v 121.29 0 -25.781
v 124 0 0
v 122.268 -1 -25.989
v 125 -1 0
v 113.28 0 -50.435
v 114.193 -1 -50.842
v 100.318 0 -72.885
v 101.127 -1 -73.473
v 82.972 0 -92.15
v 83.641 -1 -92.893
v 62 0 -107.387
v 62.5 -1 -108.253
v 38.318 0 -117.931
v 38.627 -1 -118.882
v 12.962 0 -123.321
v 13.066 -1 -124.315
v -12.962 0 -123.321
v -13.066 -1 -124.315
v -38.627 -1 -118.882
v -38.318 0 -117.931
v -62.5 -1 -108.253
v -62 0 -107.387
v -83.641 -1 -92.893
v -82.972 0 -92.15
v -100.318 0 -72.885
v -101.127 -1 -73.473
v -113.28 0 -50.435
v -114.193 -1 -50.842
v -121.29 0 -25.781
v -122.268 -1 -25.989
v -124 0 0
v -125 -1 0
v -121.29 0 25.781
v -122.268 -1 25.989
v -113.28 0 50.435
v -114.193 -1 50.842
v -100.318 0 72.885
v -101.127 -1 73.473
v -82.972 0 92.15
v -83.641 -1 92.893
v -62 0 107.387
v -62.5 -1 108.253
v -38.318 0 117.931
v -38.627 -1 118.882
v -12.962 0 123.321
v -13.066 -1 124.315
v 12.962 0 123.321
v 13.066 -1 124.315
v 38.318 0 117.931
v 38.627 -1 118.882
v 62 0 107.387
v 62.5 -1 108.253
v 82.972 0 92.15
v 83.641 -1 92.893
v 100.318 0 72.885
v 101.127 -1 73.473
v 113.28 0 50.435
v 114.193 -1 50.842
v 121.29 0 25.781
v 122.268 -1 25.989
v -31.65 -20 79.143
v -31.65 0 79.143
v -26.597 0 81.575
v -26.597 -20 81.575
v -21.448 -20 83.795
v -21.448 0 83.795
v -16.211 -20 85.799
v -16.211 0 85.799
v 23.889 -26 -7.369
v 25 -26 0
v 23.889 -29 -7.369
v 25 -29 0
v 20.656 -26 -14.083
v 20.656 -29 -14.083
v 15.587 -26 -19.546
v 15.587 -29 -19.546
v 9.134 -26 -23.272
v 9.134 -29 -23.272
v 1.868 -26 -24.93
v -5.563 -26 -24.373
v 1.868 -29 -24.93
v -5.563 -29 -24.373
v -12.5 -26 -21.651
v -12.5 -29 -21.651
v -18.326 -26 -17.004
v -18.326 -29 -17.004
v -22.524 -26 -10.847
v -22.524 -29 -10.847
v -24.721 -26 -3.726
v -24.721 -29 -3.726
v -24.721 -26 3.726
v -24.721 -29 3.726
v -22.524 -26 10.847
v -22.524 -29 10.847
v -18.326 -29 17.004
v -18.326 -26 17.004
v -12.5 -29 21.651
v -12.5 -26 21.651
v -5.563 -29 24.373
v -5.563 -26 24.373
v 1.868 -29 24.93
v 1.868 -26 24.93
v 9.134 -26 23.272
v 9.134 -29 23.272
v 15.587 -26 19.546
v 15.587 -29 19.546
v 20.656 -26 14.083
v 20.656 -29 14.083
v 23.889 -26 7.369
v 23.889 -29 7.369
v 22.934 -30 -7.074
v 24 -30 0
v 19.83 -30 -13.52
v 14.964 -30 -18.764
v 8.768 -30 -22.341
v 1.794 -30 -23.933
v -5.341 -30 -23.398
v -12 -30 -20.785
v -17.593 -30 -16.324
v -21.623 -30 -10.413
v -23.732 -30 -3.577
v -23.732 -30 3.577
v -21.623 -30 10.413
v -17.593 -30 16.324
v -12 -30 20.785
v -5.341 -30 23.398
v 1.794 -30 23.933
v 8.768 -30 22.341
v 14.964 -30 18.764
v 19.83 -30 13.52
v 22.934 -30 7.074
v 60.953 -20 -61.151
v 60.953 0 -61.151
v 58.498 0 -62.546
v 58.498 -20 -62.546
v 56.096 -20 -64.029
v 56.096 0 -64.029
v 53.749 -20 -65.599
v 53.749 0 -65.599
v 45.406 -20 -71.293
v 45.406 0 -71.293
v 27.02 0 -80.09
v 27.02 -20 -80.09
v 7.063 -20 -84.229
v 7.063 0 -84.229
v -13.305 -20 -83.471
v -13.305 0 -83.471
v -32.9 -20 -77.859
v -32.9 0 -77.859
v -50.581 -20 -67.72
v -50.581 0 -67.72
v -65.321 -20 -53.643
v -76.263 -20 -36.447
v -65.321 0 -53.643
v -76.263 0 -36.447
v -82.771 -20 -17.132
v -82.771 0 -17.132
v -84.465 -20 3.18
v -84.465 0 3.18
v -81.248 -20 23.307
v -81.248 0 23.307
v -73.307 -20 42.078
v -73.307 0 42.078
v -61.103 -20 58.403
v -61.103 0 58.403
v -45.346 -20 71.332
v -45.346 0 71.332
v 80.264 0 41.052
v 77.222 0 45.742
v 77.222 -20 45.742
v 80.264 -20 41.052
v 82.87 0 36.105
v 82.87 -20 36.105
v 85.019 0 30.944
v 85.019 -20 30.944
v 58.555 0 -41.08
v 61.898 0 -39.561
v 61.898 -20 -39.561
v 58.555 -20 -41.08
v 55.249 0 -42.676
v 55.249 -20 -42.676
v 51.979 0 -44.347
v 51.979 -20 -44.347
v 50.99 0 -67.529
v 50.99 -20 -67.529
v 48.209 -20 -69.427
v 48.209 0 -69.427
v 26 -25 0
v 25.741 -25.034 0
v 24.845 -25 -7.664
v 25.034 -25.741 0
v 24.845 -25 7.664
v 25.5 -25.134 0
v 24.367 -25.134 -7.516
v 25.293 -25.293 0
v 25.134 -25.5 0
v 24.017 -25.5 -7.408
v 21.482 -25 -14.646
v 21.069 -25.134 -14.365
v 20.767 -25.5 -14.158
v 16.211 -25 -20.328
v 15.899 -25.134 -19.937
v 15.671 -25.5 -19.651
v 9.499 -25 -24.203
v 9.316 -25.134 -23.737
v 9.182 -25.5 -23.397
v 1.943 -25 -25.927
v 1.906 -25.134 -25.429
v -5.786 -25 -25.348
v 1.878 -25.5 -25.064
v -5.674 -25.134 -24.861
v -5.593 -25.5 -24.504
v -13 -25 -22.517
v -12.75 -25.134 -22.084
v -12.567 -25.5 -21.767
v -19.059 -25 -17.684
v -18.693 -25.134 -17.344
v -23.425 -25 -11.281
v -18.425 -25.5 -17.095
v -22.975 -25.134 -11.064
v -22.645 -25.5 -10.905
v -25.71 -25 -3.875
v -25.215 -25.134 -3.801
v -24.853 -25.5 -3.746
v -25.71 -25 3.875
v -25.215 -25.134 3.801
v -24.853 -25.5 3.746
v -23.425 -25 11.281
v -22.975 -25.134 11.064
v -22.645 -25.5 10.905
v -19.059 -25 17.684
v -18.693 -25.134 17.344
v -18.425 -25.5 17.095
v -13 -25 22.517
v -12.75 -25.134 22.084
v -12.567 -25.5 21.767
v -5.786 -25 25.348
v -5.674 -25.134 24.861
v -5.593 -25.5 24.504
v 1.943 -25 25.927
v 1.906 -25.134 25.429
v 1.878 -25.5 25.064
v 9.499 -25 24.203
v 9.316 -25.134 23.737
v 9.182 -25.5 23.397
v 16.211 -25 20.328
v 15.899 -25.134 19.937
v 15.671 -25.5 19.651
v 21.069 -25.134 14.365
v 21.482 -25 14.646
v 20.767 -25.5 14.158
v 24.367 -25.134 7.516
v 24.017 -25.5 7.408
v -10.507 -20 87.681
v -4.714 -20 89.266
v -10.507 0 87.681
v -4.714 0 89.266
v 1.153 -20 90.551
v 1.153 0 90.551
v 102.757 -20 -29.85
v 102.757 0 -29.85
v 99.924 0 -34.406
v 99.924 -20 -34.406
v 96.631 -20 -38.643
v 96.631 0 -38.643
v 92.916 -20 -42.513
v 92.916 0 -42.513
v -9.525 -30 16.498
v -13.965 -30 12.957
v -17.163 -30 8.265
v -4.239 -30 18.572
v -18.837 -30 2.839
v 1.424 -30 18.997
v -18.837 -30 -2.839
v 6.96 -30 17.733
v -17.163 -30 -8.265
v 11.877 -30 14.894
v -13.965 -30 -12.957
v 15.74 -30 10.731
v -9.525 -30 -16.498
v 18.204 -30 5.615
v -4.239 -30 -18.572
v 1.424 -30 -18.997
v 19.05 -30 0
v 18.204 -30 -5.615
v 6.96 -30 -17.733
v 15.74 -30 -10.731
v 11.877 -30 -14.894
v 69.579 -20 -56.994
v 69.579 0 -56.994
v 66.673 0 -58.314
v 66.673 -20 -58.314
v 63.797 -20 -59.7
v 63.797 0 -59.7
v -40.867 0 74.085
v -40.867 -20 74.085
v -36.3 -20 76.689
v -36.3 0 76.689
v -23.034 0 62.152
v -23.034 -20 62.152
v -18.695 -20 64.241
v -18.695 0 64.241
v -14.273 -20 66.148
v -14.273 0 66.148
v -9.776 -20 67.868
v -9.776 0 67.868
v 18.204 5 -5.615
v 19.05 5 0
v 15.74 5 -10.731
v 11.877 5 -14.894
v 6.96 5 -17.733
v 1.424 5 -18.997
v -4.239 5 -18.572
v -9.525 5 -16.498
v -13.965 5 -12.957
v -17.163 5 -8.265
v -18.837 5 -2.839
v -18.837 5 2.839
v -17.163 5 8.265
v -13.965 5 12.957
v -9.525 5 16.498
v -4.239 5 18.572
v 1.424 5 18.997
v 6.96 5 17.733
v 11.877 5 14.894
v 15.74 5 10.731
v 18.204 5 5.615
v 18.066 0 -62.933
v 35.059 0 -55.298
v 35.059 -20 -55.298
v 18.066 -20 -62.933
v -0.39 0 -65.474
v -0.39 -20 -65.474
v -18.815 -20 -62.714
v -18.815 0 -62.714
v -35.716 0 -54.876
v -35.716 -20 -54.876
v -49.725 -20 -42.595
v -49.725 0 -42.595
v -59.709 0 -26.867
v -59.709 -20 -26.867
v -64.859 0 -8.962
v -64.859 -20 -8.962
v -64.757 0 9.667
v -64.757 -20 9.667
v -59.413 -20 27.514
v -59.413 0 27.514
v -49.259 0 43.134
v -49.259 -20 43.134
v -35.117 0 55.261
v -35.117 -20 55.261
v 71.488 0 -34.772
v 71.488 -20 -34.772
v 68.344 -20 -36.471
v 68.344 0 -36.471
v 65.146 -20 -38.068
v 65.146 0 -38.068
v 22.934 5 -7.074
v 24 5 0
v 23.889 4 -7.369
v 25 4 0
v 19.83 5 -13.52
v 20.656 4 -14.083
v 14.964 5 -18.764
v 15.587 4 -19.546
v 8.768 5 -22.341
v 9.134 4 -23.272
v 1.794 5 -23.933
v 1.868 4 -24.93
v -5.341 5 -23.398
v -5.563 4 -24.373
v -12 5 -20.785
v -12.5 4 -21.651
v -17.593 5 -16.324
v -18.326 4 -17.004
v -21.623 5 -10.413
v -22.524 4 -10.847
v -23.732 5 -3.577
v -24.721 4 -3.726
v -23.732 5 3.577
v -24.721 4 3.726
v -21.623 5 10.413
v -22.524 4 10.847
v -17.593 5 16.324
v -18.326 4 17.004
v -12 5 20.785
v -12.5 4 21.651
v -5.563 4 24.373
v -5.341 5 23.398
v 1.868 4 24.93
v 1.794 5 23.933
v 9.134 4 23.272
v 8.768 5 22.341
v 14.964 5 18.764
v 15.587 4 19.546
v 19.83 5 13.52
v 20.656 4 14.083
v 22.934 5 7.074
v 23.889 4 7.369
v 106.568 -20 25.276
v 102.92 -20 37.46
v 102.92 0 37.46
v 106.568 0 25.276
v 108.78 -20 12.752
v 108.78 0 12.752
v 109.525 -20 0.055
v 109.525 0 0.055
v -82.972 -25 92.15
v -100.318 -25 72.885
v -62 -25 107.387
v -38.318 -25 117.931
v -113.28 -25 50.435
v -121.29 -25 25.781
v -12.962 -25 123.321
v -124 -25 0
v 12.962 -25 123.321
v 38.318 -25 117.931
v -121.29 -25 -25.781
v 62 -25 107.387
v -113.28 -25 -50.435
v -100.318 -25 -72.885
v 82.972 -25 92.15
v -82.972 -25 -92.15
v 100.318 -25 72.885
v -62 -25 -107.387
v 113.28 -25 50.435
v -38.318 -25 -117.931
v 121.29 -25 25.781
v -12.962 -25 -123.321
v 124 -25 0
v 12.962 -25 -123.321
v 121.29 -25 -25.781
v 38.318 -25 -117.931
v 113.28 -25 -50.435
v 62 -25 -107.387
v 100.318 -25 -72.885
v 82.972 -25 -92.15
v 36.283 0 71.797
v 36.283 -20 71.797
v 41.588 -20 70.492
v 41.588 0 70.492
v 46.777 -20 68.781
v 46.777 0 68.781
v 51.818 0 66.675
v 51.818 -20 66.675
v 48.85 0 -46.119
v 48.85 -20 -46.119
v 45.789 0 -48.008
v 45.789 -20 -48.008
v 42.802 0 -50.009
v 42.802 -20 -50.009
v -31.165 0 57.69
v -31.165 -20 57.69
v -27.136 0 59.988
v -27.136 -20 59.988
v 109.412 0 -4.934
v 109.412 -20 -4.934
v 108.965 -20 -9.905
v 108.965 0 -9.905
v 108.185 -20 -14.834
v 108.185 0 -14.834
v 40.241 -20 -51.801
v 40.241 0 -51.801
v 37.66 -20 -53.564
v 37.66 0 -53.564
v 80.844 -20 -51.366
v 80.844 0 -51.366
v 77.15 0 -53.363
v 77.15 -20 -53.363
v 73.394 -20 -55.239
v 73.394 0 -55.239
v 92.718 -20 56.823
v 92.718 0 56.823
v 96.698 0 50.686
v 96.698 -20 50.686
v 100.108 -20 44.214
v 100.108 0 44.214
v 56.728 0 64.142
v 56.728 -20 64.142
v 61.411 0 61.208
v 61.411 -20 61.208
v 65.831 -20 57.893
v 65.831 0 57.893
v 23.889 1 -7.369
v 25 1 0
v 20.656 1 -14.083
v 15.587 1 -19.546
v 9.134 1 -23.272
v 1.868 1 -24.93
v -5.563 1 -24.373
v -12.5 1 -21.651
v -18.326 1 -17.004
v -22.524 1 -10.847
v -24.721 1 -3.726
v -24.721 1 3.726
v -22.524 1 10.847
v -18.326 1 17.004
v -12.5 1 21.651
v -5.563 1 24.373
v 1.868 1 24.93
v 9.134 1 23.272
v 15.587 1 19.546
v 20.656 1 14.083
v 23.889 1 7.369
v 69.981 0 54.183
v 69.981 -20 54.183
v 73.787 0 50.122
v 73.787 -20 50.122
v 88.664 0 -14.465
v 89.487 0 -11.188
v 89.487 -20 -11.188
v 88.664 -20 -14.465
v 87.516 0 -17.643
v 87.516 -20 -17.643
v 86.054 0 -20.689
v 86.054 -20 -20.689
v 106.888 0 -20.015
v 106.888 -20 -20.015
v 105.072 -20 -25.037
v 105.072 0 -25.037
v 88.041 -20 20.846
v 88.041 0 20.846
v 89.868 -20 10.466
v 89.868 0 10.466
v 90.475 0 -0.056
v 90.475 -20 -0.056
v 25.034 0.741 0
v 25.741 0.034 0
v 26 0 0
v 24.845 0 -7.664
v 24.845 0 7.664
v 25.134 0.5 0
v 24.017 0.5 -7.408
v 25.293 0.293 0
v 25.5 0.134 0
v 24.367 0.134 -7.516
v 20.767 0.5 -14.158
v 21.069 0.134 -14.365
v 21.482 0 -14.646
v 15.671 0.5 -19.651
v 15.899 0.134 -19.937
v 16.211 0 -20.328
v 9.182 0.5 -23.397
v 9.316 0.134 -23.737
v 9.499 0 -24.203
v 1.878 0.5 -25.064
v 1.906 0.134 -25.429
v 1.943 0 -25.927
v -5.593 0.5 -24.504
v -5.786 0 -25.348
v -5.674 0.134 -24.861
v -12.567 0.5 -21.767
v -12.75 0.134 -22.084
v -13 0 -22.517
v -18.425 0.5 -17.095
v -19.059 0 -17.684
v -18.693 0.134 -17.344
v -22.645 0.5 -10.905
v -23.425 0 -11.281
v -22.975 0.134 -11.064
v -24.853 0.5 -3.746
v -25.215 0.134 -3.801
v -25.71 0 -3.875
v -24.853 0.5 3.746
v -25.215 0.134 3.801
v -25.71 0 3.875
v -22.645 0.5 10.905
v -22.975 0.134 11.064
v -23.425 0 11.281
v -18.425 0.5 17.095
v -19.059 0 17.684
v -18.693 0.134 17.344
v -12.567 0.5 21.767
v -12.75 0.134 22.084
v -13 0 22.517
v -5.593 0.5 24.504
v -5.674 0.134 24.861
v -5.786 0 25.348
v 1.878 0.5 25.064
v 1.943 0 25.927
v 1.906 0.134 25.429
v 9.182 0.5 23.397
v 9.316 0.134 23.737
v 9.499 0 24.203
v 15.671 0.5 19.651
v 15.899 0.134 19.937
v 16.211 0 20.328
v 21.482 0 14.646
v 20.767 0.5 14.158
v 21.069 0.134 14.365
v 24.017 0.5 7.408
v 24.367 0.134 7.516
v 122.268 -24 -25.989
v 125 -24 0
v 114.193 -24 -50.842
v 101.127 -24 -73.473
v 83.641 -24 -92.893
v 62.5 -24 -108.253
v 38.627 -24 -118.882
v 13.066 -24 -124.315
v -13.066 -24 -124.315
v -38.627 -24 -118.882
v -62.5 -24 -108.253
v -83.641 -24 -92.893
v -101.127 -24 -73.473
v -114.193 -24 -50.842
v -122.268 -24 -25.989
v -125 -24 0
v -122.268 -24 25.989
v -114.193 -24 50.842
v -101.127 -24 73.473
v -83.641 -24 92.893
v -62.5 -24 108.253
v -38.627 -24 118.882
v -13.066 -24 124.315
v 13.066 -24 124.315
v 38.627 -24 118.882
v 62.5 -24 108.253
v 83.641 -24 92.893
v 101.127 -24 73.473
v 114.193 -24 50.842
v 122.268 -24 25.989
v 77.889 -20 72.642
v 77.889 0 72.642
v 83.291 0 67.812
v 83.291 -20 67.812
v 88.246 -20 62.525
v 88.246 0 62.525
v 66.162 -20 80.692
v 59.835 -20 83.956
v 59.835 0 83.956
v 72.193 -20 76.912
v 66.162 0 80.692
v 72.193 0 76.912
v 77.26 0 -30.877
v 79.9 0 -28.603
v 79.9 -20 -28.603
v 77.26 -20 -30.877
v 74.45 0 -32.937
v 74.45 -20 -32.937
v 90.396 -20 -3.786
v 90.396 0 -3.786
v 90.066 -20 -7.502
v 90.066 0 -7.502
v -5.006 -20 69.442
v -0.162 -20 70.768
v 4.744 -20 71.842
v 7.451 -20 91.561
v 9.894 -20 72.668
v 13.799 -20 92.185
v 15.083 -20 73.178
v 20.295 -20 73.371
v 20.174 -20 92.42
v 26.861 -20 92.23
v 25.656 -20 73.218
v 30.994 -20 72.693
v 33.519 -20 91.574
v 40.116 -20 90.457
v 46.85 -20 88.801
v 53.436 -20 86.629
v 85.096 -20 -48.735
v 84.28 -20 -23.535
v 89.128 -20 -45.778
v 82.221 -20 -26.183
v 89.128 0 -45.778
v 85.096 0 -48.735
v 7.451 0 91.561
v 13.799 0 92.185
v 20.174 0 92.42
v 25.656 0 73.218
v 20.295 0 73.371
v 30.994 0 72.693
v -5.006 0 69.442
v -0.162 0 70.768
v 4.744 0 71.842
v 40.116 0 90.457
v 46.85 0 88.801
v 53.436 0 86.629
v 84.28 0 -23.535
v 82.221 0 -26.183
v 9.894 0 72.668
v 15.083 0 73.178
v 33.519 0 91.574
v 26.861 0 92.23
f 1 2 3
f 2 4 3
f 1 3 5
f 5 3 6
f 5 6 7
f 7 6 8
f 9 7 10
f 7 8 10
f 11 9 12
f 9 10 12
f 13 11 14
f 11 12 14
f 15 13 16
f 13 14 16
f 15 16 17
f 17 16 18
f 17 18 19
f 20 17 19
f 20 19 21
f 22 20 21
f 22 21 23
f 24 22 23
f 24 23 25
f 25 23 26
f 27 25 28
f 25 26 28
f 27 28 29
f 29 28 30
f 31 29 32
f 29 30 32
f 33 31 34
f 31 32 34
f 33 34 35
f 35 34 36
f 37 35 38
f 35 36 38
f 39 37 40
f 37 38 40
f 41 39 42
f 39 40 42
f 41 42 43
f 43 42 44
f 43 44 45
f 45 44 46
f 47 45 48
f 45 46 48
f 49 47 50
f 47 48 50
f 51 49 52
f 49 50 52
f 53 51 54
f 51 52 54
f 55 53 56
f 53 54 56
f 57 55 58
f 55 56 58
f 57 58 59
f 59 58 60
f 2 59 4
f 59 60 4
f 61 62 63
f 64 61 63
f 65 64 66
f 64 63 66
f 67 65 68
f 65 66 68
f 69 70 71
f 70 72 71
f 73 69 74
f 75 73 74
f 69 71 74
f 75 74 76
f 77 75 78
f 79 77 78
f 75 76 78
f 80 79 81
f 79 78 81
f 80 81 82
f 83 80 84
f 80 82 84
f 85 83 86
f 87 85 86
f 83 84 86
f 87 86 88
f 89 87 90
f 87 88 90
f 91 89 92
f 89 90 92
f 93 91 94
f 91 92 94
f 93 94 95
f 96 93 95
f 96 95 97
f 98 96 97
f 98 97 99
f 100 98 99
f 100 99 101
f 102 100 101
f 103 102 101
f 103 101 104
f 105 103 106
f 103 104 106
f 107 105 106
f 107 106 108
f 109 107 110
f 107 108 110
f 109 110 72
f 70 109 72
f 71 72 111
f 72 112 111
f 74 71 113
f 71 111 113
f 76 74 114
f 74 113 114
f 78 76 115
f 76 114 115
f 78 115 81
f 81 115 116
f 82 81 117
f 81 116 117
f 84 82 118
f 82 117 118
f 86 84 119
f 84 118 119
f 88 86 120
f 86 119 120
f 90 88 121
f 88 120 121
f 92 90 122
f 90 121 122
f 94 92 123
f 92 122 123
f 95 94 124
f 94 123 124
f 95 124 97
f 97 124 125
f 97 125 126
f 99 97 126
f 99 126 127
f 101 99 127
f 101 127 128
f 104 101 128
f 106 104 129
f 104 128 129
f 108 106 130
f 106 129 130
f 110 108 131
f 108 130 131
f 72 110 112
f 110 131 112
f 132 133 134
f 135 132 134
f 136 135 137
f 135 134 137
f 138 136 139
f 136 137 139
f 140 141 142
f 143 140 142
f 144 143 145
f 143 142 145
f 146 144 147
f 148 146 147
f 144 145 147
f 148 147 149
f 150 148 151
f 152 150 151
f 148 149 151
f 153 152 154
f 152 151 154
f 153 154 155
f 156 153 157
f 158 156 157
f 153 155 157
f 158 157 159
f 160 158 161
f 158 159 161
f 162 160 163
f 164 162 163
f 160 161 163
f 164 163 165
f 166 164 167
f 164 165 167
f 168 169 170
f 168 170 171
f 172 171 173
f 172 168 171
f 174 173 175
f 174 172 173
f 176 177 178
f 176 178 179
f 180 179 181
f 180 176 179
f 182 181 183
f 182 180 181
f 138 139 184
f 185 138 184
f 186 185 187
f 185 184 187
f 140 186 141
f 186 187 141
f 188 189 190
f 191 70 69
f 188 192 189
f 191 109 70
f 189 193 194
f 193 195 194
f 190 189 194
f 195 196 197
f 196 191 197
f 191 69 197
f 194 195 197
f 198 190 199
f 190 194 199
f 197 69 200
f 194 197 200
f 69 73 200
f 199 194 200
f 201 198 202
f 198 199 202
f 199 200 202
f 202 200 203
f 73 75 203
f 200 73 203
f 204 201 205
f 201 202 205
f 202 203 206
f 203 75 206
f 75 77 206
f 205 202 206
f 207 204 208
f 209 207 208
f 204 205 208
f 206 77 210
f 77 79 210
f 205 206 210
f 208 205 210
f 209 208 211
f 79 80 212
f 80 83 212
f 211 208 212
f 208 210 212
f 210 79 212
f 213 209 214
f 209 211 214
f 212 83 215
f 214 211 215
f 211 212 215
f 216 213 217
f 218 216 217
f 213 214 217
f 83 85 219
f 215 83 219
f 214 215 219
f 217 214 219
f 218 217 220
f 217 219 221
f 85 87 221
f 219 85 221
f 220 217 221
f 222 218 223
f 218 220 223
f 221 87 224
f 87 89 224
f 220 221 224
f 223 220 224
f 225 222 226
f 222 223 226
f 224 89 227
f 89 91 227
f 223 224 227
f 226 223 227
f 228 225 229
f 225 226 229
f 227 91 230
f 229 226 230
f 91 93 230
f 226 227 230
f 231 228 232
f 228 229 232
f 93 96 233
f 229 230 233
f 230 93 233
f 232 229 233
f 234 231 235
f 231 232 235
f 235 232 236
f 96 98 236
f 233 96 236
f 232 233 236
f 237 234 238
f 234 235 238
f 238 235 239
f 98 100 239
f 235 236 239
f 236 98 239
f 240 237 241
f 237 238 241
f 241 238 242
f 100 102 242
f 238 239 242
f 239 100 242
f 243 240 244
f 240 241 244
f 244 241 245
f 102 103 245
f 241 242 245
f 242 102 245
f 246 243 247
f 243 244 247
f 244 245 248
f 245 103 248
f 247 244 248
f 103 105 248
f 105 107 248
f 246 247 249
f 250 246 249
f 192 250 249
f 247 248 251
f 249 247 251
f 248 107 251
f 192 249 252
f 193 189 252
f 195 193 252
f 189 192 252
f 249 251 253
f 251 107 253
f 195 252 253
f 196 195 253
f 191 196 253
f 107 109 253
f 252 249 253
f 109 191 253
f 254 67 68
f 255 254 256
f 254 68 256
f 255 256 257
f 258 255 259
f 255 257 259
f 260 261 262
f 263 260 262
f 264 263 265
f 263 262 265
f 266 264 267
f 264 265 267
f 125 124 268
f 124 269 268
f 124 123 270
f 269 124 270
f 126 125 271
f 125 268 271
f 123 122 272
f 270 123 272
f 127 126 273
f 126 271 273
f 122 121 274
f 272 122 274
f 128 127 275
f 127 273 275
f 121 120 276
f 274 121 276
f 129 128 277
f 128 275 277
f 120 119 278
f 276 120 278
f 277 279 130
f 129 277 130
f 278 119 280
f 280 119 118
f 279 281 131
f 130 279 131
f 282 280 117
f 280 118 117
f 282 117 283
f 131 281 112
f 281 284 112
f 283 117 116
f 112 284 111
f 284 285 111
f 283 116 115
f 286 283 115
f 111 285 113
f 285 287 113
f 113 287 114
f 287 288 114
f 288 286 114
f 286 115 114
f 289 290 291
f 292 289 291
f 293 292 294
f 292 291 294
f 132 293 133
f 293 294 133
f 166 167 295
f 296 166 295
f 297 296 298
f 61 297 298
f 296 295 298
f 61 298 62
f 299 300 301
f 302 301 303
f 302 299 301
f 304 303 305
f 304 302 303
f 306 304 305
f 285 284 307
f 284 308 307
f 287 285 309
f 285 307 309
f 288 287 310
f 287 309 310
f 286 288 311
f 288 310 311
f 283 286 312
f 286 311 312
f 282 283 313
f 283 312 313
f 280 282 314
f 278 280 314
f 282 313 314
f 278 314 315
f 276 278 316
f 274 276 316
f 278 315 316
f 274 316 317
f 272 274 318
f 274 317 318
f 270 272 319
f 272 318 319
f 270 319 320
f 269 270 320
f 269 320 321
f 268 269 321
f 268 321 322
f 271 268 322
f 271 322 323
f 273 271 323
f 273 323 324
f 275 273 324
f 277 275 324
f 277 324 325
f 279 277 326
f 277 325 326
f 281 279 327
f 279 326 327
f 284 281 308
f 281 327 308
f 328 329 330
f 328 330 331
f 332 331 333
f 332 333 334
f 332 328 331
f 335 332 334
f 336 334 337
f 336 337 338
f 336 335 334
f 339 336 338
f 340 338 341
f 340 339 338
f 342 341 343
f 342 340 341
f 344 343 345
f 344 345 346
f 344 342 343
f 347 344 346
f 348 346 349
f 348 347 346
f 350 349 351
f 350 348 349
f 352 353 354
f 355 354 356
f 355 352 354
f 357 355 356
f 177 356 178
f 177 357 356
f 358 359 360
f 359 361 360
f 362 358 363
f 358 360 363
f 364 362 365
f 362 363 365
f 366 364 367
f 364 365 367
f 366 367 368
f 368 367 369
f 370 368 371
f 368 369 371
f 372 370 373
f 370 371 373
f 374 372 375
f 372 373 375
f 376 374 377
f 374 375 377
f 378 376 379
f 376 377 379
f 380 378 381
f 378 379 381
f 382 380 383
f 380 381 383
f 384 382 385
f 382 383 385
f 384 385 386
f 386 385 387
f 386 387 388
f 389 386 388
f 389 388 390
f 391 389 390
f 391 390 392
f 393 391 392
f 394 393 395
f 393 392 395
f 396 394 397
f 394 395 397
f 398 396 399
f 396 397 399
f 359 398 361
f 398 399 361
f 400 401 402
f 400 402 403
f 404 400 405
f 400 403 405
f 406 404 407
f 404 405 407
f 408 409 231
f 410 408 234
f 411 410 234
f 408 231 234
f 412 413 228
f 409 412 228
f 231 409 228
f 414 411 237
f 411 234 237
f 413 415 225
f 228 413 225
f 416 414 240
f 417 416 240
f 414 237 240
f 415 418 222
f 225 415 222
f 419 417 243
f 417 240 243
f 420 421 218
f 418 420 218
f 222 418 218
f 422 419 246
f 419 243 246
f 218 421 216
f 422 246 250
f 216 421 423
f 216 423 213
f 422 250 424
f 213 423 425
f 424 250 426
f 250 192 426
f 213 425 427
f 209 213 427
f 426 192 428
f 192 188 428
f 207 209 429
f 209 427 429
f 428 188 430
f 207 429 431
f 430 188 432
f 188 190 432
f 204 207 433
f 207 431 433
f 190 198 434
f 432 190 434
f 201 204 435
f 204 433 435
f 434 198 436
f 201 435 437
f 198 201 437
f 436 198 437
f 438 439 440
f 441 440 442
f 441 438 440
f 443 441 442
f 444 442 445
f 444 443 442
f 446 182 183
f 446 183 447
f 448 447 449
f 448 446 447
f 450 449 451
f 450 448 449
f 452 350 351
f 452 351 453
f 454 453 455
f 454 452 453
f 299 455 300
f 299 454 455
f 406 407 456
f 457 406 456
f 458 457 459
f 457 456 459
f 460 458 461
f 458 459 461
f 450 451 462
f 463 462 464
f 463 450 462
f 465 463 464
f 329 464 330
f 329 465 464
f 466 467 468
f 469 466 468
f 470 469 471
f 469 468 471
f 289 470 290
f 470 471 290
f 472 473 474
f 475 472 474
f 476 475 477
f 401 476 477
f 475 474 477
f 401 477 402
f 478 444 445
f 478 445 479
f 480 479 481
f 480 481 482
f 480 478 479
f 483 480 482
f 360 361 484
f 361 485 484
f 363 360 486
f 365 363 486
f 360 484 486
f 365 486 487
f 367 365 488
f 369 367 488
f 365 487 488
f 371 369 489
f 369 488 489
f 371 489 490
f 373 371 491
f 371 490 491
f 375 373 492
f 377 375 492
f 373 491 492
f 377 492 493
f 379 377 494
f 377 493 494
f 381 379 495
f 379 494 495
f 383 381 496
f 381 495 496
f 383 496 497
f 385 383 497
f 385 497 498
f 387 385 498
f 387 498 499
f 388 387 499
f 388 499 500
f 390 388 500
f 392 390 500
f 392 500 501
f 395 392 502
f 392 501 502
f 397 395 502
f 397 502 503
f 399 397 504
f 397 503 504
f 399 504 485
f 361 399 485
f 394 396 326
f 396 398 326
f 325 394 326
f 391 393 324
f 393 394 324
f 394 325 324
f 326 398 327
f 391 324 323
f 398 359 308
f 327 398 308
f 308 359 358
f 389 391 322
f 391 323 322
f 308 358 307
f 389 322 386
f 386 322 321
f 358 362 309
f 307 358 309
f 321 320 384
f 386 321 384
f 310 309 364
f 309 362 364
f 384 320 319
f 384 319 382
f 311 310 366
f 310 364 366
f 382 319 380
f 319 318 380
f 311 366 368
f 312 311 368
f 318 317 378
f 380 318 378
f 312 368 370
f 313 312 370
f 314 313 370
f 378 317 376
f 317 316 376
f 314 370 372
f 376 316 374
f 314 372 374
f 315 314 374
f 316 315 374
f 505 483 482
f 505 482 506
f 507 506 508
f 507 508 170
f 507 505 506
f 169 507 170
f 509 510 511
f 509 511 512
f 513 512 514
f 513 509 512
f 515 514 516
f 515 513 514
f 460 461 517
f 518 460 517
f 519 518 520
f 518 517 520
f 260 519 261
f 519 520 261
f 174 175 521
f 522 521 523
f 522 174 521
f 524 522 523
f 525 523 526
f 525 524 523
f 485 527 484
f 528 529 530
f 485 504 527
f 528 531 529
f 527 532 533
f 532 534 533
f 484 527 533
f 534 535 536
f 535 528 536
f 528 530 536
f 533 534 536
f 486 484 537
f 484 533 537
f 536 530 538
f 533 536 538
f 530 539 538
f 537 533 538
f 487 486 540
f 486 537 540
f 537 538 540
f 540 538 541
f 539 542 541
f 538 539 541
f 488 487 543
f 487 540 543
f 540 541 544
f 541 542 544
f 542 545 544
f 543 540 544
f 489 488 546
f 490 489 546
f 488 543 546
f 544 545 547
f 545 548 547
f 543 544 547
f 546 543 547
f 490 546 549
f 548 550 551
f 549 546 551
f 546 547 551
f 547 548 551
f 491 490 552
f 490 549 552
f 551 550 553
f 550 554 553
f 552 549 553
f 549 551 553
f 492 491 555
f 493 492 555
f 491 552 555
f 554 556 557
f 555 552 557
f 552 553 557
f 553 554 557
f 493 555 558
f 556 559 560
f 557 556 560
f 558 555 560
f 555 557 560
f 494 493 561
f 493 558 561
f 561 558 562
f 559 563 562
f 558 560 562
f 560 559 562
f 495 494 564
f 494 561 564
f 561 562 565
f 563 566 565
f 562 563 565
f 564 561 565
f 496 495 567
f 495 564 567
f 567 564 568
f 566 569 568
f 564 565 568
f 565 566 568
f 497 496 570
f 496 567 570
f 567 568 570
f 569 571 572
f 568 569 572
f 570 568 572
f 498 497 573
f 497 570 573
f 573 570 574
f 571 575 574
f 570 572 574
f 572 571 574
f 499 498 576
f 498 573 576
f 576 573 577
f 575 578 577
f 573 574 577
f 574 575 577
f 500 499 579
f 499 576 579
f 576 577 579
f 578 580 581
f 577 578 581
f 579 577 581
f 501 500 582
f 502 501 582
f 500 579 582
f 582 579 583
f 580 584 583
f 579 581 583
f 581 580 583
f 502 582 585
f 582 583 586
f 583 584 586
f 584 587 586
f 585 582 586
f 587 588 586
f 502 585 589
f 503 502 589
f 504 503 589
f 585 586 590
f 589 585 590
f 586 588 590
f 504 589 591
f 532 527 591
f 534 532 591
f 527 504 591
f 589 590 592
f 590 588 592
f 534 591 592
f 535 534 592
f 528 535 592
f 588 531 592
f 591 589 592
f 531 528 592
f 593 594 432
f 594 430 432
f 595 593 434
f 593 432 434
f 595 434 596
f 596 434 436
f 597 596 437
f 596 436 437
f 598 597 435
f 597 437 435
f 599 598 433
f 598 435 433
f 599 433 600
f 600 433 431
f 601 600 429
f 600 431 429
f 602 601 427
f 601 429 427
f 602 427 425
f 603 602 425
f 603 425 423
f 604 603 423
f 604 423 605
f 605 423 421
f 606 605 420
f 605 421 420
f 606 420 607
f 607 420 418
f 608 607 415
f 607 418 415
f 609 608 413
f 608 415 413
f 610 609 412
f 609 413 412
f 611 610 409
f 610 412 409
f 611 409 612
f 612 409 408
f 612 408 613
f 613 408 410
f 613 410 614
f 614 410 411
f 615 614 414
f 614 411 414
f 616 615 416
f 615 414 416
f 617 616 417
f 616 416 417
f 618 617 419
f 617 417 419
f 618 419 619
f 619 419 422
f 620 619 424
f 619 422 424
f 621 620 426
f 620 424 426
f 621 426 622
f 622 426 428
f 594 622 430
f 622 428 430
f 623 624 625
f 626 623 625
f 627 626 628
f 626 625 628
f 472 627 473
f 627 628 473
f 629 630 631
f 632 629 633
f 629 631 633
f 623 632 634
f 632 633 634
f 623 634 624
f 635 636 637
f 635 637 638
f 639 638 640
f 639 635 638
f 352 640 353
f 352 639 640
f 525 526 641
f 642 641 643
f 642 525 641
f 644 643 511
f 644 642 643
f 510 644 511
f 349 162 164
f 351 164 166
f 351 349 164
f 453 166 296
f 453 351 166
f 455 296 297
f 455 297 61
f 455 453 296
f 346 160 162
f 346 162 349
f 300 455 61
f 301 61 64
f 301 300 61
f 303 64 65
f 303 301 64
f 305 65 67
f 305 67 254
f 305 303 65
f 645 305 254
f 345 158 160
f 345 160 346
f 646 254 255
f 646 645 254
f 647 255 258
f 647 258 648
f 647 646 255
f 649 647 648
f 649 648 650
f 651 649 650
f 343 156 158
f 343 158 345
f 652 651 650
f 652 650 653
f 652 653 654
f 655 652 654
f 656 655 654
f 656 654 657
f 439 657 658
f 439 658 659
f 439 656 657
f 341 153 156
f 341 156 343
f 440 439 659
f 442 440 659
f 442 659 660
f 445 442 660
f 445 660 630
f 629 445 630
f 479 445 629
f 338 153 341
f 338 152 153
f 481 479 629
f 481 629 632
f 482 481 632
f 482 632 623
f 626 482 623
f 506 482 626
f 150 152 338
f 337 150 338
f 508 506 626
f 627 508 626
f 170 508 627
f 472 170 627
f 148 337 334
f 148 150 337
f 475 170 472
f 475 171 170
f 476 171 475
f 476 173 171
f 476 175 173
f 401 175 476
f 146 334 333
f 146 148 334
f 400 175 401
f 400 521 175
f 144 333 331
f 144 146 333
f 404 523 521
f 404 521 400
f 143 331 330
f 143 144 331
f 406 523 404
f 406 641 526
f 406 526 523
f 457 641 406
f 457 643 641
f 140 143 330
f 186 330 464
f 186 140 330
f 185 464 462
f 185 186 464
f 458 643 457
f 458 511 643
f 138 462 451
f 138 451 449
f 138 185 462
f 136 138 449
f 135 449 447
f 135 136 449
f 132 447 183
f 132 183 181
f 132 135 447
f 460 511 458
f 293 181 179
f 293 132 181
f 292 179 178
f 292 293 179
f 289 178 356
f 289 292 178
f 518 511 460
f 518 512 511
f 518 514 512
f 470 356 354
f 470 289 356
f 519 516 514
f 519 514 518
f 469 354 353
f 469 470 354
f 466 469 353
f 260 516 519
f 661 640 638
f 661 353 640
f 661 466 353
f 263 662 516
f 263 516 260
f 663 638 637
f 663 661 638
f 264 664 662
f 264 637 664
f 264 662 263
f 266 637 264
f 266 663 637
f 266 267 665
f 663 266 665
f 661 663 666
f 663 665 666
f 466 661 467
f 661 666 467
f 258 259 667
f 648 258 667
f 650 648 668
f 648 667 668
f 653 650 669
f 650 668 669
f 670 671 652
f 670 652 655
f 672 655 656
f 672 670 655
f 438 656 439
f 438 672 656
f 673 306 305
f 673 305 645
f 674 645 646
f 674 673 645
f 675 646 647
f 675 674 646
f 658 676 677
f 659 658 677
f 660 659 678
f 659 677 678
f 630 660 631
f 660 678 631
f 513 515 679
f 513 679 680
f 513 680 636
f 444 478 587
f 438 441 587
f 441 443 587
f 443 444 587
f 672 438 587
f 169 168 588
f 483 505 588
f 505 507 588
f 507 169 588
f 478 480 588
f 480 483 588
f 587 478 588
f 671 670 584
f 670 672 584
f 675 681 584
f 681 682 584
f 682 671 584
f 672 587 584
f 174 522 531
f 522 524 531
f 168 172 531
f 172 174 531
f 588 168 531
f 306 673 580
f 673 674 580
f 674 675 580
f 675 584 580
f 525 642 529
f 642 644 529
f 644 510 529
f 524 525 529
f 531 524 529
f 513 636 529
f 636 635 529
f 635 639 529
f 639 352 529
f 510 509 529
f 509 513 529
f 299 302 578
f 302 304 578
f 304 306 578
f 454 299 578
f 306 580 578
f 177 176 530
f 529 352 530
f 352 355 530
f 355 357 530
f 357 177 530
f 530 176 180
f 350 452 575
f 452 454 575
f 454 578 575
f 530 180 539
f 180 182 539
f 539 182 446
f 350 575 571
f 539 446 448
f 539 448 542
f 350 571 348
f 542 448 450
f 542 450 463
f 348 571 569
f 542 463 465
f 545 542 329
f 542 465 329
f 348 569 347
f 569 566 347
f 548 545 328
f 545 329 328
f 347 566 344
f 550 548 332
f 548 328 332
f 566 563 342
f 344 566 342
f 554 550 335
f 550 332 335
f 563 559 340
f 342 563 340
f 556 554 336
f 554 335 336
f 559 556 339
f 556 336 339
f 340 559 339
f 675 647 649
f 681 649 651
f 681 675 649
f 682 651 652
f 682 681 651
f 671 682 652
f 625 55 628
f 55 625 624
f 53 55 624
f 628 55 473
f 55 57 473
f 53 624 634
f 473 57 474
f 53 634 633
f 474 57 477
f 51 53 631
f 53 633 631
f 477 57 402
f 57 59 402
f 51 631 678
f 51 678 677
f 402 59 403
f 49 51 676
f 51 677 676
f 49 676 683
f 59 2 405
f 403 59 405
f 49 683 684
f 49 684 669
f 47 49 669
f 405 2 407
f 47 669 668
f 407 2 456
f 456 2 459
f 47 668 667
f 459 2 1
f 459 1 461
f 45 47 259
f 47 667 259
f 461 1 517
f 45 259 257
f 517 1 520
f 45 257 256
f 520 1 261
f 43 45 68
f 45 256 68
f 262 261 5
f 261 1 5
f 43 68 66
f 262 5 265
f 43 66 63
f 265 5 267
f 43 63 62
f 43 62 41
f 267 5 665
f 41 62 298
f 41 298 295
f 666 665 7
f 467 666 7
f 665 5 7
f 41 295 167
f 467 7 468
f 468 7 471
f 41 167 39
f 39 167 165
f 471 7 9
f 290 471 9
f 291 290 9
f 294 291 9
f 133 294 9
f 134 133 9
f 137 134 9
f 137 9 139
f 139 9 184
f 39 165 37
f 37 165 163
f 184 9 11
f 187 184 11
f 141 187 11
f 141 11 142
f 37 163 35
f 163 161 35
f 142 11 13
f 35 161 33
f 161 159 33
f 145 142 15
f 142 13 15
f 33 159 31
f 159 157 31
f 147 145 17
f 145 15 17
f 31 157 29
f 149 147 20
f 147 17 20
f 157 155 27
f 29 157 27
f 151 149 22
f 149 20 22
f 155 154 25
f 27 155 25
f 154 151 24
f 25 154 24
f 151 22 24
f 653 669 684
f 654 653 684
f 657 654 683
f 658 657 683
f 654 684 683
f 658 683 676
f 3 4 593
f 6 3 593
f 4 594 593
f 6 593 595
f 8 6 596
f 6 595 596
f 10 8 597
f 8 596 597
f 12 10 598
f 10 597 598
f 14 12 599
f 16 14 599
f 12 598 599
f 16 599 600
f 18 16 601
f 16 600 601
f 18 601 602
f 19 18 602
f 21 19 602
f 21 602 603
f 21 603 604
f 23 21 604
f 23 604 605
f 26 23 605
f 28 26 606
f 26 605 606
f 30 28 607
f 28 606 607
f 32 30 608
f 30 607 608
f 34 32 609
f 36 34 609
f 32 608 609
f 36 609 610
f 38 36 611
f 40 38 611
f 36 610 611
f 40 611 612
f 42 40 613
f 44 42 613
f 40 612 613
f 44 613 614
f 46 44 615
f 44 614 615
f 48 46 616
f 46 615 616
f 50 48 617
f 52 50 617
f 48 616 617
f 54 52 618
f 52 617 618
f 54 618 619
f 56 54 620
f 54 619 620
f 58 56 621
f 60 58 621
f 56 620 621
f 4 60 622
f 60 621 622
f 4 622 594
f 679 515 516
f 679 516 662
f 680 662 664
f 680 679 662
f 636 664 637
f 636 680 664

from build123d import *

# Parameters (mm, degrees)
CUT_EXTRUDE_THIN1_DEPTH      = 15
CUT_EXTRUDE_THIN1_DEPTH_BACK = 20


with BuildPart() as part:
    # Sketch1 → Base-Revolve (revolve)
    with BuildSketch(Plane.XY):
        with BuildLine():
            Line((19.05, 5), (24, 5))
            Line((24, 5), (25, 4))
            Line((25, 4), (25, 1))
            ThreePointArc((25, 1), (25.292893219, 0.292893219), (26, 0))
            Line((26, 0), (124, 0))
            Line((124, 0), (125, -1))
            Line((125, -1), (125, -24))
            Line((125, -24), (124, -25))
            Line((124, -25), (26, -25))
            ThreePointArc((26, -25), (25.292893219, -25.292893219), (25, -26))
            Line((25, -26), (25, -29))
            Line((25, -29), (24, -30))
            Line((24, -30), (19.05, -30))
            Line((19.05, -30), (19.05, 5))
        make_face()
    revolve(axis=Axis((0, -30350, 0), (0, 1, 0)))

    # Sketch2 → Cut-Extrude-Thin1 (cut, two sides)
    with BuildSketch(Plane(origin=(0, 0, 0), x_dir=(1, 0, 0), z_dir=(0, 1, 0))) as cut_extrude_thin1_sk:
        with BuildLine():
            ThreePointArc((109.524986247, -0.054887133), (109.229921991, 7.423375501), (108.184717895, 14.834112532))
            ThreePointArc((108.184717895, 14.834112532), (106.043659804, 22.548927161), (102.756924095, 29.84960267))
            ThreePointArc((102.756924095, 29.84960267), (98.332860497, 36.567183371), (92.916011248, 42.513272287))
            ThreePointArc((92.916011248, 42.513272287), (87.141221214, 47.295885443), (80.843977188, 51.366058191))
            ThreePointArc((80.843977188, 51.366058191), (75.279655517, 54.316272842), (69.579158541, 56.993916655))
            ThreePointArc((69.579158541, 56.993916655), (65.230785476, 58.999236045), (60.953055197, 61.151137028))
            ThreePointArc((60.953055197, 61.151137028), (57.290135984, 63.276226982), (53.749285638, 65.599019115))
            ThreePointArc((53.749285638, 65.599019115), (49.601954473, 68.481518372), (45.406369026, 71.293318599))
            ThreePointArc((45.406369026, 71.293318599), (-71.312570217, 45.376127579), (-45.345877971, -71.331809006))
            ThreePointArc((-45.345877971, -71.331809006), (-38.593898018, -75.405527827), (-31.649923168, -79.142589722))
            ThreePointArc((-31.649923168, -79.142589722), (-24.034421899, -82.711545409), (-16.211151125, -85.798572893))
            ThreePointArc((-16.211151125, -85.798572893), (-7.620932162, -88.510877367), (1.153325471, -90.550696085))
            ThreePointArc((1.153325471, -90.550696085), (10.620649637, -91.921398106), (20.173660561, -92.420430343))
            ThreePointArc((20.173660561, -92.420430343), (30.195991067, -91.960061817), (40.115734041, -90.457481608))
            ThreePointArc((40.115734041, -90.457481608), (50.164053761, -87.778443627), (59.835395829, -83.955994636))
            ThreePointArc((59.835395829, -83.955994636), (69.217053614, -78.865285844), (77.888616734, -72.641556104))
            ThreePointArc((77.888616734, -72.641556104), (85.826699629, -65.22323814), (92.717665183, -56.823286045))
            ThreePointArc((92.717665183, -56.823286045), (98.476591418, -47.488521124), (102.919592608, -37.460420212))
            ThreePointArc((102.919592608, -37.460420212), (107.856238797, -19.046190631), (109.524986247, -0.054887133))
        make_face()
        with BuildLine():
            ThreePointArc((90.474982456, 0.056342792), (90.262741838, 5.647173284), (89.486847533, 11.187969228))
            ThreePointArc((89.486847533, 11.187969228), (88.12991005, 16.068178084), (86.054133631, 20.688661832))
            ThreePointArc((86.054133631, 20.688661832), (83.284958022, 24.885433828), (79.899946609, 28.603353472))
            ThreePointArc((79.899946609, 28.603353472), (75.875178075, 31.93428485), (71.488414915, 34.771567807))
            ThreePointArc((71.488414915, 34.771567807), (66.751022738, 37.282035549), (61.898062734, 39.56109503))
            ThreePointArc((61.898062734, 39.56109503), (56.897401317, 41.868517981), (51.979131099, 44.346709525))
            ThreePointArc((51.979131099, 44.346709525), (47.310945971, 47.049113929), (42.801511531, 50.008834013))
            ThreePointArc((42.801511531, 50.008834013), (38.952515201, 52.685804726), (35.059073926, 55.297712072))
            ThreePointArc((35.059073926, 55.297712072), (-55.279422123, 35.087905534), (-35.1167276, -55.261117141))
            ThreePointArc((-35.1167276, -55.261117141), (-29.160317457, -58.855298852), (-23.034341253, -62.152173057))
            ThreePointArc((-23.034341253, -62.152173057), (-16.494338073, -65.217270915), (-9.775872963, -67.868439157))
            ThreePointArc((-9.775872963, -67.868439157), (-2.592647115, -70.136469906), (4.744453336, -71.842240708))
            ThreePointArc((4.744453336, -71.842240708), (12.484550044, -72.962801762), (20.294689574, -73.370814789))
            ThreePointArc((20.294689574, -73.370814789), (28.32982468, -73.001688389), (36.282721862, -71.797081864))
            ThreePointArc((36.282721862, -71.797081864), (44.198795786, -69.686506265), (51.817937068, -66.675286938))
            ThreePointArc((51.817937068, -66.675286938), (59.100153222, -62.723698973), (65.831324035, -57.892854425))
            ThreePointArc((65.831324035, -57.892854425), (71.928664779, -52.194534162), (77.221947559, -45.742435637))
            ThreePointArc((77.221947559, -45.742435637), (81.623193338, -38.607897611), (85.018936267, -30.943595477))
            ThreePointArc((85.018936267, -30.943595477), (89.105431486, -15.682719937), (90.474982456, 0.056342792))
        make_face(mode=Mode.SUBTRACT)
    extrude(amount=CUT_EXTRUDE_THIN1_DEPTH, mode=Mode.SUBTRACT)
    extrude(cut_extrude_thin1_sk.sketch, amount=-CUT_EXTRUDE_THIN1_DEPTH_BACK, mode=Mode.SUBTRACT)


solid = part.part
